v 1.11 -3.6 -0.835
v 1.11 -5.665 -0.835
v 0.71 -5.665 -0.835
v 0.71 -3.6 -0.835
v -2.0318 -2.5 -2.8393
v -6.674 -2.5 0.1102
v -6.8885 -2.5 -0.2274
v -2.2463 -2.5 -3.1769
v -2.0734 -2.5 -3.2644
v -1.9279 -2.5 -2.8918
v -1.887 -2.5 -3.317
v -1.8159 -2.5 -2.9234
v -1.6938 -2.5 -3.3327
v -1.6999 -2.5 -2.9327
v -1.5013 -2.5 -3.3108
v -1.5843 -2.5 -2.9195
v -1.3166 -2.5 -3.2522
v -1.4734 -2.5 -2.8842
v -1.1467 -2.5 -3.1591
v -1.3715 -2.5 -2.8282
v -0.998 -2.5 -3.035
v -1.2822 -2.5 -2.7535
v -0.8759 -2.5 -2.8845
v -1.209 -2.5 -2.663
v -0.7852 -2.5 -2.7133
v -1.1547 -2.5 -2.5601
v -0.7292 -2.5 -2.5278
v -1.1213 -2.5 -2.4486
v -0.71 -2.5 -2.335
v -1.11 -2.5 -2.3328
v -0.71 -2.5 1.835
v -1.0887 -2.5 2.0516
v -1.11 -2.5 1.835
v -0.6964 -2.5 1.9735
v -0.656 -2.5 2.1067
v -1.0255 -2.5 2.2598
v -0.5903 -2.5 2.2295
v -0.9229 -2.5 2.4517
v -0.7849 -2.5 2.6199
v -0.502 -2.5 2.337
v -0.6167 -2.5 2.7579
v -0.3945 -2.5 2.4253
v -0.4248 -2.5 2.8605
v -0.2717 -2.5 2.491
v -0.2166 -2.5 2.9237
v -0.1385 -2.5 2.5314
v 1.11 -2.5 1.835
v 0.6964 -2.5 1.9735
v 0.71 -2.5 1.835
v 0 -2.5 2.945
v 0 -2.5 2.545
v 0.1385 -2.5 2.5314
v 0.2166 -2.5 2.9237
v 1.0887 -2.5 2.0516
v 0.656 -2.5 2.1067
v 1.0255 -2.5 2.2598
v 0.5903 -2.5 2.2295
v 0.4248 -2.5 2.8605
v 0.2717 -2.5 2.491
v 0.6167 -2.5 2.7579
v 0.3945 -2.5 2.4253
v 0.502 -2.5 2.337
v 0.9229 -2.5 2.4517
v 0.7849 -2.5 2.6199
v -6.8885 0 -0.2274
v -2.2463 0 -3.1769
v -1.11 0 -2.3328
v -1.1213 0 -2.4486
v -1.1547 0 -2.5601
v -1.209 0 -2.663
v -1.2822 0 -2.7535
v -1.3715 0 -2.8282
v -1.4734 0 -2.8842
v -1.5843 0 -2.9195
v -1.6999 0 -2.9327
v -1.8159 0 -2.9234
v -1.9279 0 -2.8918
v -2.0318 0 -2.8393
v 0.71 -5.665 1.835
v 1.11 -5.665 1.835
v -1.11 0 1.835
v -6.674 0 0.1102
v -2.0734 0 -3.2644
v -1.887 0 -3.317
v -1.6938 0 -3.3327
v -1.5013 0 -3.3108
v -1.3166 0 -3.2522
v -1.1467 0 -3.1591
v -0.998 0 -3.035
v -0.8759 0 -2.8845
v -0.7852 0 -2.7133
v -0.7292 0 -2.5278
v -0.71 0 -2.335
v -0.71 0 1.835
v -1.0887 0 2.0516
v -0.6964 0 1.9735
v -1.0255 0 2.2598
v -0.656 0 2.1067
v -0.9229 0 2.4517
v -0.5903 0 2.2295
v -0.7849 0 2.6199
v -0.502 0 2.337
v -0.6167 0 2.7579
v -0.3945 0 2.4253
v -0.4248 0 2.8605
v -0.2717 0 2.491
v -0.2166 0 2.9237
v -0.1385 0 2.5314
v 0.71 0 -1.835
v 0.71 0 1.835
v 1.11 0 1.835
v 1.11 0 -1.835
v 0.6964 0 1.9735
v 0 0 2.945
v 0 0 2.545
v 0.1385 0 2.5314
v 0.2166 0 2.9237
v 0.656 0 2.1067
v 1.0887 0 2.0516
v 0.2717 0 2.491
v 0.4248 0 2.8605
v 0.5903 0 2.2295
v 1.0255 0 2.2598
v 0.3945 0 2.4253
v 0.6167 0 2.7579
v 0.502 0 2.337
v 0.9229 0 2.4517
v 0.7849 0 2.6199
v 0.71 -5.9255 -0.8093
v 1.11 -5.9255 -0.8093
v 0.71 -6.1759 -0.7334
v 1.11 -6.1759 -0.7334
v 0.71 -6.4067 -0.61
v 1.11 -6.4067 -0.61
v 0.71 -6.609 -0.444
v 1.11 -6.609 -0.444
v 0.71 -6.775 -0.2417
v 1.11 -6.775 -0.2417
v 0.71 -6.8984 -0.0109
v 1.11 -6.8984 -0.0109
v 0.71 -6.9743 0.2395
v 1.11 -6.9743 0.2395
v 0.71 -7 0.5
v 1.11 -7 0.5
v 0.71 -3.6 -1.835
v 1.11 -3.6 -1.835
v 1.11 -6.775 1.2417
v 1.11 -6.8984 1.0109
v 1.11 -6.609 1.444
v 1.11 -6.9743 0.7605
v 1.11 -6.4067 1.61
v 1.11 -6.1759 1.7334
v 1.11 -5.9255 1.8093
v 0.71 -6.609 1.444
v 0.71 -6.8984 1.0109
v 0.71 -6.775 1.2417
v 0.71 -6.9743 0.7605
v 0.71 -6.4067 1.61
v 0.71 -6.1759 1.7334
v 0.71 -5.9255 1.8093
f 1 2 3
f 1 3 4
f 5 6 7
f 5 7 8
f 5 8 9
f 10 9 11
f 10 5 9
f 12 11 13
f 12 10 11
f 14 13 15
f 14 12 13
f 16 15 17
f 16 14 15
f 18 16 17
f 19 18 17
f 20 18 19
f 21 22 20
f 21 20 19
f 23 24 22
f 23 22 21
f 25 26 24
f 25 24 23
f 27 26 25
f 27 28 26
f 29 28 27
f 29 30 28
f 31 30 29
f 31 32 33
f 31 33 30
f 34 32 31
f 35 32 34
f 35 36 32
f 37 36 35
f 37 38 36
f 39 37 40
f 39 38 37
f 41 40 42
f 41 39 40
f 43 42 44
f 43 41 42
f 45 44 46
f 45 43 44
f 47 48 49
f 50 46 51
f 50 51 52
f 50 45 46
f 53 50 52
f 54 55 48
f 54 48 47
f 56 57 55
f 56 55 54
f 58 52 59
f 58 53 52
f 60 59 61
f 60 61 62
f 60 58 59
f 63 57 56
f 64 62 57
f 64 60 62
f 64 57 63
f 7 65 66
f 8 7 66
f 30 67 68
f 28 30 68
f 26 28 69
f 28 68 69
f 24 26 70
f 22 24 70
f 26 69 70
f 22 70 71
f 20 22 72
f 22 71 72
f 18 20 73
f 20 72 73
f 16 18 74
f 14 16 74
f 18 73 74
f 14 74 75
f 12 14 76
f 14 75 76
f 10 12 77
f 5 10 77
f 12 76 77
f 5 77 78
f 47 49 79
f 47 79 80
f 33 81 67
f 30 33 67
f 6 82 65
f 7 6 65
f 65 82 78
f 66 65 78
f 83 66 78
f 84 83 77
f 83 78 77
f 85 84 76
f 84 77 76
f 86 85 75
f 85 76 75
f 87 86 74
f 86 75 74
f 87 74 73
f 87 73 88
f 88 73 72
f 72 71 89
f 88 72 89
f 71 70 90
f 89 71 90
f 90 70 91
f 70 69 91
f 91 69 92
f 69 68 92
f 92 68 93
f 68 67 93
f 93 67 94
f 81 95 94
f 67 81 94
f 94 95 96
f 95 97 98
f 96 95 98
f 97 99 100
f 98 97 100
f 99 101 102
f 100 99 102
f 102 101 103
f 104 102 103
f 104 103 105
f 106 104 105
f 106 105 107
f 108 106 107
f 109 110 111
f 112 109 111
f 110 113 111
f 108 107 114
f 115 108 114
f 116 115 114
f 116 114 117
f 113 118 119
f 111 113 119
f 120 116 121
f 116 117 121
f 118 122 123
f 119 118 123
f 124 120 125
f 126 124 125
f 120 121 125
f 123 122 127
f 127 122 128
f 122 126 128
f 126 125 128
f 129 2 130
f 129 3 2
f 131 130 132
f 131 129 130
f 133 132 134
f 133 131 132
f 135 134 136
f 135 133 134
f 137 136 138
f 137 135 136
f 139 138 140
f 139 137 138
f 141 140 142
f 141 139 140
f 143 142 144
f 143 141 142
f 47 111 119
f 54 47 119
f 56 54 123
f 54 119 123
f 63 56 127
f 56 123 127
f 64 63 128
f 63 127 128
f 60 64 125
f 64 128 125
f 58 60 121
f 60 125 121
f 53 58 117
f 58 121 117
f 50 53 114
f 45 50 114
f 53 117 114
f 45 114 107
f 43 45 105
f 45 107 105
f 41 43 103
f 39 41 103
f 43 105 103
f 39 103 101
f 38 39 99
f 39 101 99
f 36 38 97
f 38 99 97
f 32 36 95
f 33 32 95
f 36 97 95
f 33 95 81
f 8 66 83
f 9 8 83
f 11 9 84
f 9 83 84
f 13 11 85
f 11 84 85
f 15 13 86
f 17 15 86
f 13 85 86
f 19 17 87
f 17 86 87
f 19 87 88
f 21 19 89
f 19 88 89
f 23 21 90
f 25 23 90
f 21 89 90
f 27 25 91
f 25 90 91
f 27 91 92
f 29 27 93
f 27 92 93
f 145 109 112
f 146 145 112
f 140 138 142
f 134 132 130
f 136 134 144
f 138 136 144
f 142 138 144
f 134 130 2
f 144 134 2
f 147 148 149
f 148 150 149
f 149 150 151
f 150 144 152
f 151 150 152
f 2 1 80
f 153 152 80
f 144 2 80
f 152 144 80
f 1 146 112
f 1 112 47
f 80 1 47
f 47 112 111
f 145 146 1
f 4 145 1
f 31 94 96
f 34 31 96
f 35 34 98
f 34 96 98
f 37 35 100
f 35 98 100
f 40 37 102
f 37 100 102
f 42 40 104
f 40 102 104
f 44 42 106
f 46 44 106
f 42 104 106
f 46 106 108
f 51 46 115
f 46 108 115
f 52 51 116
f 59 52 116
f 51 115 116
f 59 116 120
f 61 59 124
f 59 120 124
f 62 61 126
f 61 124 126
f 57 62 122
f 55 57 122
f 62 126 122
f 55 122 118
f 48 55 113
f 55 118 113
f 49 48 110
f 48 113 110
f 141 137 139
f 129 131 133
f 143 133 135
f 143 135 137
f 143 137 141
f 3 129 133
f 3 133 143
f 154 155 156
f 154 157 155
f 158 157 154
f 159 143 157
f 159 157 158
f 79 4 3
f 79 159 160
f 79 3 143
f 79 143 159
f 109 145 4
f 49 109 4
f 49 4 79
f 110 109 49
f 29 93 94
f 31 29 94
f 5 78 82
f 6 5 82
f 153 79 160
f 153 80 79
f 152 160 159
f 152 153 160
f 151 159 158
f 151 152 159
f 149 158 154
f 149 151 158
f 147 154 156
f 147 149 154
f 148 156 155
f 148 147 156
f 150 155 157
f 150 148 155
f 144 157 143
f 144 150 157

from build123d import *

# Parameters (mm, degrees)
F1_DEPTH = 2.5
F2_W     = 0.4
F2_H     = 3.67
F3_DEPTH = 4.5
F4_W     = 3.4
F4_H     = 1
F5_DEPTH = 25
F6_R     = 1.33499


# Not quite as in the source:
# - a fillet or chamfer is up to 0.001 mm smaller than in the source, because OpenCascade refuses the exact size
# - ends of sketch curves that miss each other by under 0.0002 mm in the source are joined


with BuildPart() as f1:
    # F0 (on Front) → F1 (new body)
    with BuildSketch(Plane.XZ):
        with BuildLine():
            Line((0.71, 1.835), (0.71, -1.835))
            Line((0.71, -1.835), (1.11, -1.835))
            Line((1.11, -1.835), (1.11, 1.835))
            ThreePointArc((1.11, 1.835), (0, 2.945), (-1.11, 1.835))
            Line((-1.11, 1.835), (-1.11, -2.3328240747))
            ThreePointArc((-1.11, -2.3328240747), (-1.421083088, -2.8586837383), (-2.031758919, -2.8392524256))
            Line((-2.031758919, -2.8392524256), (-6.6740188024, 0.1102260326))
            Line((-6.6740188024, 0.1102260326), (-6.8885263266, -0.227392868))
            Line((-6.8885263266, -0.227392868), (-2.2462664432, -3.1768713262))
            ThreePointArc((-2.2462664432, -3.1768713262), (-1.2294272033, -3.2097802095), (-0.71, -2.335))
            Line((-0.71, -2.335), (-0.71, 1.835))
            ThreePointArc((-0.71, 1.835), (0, 2.545), (0.71, 1.835))
        make_face()
    extrude(amount=F1_DEPTH)

    # F2 (on face) → F3 (join)
    with BuildSketch(Plane.XZ.offset(2.5)):
        with Locations((0.91, 0)):
            Rectangle(F2_W, F2_H)
    extrude(amount=F3_DEPTH)

    # F4 (on face) → F5 (cut)
    with BuildSketch(Plane.YZ.offset(1.11)):
        with Locations((-5.3, -1.335)):
            Rectangle(F4_W, F4_H)
    extrude(amount=-F5_DEPTH, mode=Mode.SUBTRACT)

    # F6 (radius 1.335 in the source; OpenCascade refuses exactly that, so slightly less here)
    f6_edges = [f1.edges().sort_by_distance(p)[0] for p in [
        (0.91, -7, 1.835),
        (0.91, -7, -0.835),
    ]]
    fillet(f6_edges, radius=F6_R)


solid = f1.part
